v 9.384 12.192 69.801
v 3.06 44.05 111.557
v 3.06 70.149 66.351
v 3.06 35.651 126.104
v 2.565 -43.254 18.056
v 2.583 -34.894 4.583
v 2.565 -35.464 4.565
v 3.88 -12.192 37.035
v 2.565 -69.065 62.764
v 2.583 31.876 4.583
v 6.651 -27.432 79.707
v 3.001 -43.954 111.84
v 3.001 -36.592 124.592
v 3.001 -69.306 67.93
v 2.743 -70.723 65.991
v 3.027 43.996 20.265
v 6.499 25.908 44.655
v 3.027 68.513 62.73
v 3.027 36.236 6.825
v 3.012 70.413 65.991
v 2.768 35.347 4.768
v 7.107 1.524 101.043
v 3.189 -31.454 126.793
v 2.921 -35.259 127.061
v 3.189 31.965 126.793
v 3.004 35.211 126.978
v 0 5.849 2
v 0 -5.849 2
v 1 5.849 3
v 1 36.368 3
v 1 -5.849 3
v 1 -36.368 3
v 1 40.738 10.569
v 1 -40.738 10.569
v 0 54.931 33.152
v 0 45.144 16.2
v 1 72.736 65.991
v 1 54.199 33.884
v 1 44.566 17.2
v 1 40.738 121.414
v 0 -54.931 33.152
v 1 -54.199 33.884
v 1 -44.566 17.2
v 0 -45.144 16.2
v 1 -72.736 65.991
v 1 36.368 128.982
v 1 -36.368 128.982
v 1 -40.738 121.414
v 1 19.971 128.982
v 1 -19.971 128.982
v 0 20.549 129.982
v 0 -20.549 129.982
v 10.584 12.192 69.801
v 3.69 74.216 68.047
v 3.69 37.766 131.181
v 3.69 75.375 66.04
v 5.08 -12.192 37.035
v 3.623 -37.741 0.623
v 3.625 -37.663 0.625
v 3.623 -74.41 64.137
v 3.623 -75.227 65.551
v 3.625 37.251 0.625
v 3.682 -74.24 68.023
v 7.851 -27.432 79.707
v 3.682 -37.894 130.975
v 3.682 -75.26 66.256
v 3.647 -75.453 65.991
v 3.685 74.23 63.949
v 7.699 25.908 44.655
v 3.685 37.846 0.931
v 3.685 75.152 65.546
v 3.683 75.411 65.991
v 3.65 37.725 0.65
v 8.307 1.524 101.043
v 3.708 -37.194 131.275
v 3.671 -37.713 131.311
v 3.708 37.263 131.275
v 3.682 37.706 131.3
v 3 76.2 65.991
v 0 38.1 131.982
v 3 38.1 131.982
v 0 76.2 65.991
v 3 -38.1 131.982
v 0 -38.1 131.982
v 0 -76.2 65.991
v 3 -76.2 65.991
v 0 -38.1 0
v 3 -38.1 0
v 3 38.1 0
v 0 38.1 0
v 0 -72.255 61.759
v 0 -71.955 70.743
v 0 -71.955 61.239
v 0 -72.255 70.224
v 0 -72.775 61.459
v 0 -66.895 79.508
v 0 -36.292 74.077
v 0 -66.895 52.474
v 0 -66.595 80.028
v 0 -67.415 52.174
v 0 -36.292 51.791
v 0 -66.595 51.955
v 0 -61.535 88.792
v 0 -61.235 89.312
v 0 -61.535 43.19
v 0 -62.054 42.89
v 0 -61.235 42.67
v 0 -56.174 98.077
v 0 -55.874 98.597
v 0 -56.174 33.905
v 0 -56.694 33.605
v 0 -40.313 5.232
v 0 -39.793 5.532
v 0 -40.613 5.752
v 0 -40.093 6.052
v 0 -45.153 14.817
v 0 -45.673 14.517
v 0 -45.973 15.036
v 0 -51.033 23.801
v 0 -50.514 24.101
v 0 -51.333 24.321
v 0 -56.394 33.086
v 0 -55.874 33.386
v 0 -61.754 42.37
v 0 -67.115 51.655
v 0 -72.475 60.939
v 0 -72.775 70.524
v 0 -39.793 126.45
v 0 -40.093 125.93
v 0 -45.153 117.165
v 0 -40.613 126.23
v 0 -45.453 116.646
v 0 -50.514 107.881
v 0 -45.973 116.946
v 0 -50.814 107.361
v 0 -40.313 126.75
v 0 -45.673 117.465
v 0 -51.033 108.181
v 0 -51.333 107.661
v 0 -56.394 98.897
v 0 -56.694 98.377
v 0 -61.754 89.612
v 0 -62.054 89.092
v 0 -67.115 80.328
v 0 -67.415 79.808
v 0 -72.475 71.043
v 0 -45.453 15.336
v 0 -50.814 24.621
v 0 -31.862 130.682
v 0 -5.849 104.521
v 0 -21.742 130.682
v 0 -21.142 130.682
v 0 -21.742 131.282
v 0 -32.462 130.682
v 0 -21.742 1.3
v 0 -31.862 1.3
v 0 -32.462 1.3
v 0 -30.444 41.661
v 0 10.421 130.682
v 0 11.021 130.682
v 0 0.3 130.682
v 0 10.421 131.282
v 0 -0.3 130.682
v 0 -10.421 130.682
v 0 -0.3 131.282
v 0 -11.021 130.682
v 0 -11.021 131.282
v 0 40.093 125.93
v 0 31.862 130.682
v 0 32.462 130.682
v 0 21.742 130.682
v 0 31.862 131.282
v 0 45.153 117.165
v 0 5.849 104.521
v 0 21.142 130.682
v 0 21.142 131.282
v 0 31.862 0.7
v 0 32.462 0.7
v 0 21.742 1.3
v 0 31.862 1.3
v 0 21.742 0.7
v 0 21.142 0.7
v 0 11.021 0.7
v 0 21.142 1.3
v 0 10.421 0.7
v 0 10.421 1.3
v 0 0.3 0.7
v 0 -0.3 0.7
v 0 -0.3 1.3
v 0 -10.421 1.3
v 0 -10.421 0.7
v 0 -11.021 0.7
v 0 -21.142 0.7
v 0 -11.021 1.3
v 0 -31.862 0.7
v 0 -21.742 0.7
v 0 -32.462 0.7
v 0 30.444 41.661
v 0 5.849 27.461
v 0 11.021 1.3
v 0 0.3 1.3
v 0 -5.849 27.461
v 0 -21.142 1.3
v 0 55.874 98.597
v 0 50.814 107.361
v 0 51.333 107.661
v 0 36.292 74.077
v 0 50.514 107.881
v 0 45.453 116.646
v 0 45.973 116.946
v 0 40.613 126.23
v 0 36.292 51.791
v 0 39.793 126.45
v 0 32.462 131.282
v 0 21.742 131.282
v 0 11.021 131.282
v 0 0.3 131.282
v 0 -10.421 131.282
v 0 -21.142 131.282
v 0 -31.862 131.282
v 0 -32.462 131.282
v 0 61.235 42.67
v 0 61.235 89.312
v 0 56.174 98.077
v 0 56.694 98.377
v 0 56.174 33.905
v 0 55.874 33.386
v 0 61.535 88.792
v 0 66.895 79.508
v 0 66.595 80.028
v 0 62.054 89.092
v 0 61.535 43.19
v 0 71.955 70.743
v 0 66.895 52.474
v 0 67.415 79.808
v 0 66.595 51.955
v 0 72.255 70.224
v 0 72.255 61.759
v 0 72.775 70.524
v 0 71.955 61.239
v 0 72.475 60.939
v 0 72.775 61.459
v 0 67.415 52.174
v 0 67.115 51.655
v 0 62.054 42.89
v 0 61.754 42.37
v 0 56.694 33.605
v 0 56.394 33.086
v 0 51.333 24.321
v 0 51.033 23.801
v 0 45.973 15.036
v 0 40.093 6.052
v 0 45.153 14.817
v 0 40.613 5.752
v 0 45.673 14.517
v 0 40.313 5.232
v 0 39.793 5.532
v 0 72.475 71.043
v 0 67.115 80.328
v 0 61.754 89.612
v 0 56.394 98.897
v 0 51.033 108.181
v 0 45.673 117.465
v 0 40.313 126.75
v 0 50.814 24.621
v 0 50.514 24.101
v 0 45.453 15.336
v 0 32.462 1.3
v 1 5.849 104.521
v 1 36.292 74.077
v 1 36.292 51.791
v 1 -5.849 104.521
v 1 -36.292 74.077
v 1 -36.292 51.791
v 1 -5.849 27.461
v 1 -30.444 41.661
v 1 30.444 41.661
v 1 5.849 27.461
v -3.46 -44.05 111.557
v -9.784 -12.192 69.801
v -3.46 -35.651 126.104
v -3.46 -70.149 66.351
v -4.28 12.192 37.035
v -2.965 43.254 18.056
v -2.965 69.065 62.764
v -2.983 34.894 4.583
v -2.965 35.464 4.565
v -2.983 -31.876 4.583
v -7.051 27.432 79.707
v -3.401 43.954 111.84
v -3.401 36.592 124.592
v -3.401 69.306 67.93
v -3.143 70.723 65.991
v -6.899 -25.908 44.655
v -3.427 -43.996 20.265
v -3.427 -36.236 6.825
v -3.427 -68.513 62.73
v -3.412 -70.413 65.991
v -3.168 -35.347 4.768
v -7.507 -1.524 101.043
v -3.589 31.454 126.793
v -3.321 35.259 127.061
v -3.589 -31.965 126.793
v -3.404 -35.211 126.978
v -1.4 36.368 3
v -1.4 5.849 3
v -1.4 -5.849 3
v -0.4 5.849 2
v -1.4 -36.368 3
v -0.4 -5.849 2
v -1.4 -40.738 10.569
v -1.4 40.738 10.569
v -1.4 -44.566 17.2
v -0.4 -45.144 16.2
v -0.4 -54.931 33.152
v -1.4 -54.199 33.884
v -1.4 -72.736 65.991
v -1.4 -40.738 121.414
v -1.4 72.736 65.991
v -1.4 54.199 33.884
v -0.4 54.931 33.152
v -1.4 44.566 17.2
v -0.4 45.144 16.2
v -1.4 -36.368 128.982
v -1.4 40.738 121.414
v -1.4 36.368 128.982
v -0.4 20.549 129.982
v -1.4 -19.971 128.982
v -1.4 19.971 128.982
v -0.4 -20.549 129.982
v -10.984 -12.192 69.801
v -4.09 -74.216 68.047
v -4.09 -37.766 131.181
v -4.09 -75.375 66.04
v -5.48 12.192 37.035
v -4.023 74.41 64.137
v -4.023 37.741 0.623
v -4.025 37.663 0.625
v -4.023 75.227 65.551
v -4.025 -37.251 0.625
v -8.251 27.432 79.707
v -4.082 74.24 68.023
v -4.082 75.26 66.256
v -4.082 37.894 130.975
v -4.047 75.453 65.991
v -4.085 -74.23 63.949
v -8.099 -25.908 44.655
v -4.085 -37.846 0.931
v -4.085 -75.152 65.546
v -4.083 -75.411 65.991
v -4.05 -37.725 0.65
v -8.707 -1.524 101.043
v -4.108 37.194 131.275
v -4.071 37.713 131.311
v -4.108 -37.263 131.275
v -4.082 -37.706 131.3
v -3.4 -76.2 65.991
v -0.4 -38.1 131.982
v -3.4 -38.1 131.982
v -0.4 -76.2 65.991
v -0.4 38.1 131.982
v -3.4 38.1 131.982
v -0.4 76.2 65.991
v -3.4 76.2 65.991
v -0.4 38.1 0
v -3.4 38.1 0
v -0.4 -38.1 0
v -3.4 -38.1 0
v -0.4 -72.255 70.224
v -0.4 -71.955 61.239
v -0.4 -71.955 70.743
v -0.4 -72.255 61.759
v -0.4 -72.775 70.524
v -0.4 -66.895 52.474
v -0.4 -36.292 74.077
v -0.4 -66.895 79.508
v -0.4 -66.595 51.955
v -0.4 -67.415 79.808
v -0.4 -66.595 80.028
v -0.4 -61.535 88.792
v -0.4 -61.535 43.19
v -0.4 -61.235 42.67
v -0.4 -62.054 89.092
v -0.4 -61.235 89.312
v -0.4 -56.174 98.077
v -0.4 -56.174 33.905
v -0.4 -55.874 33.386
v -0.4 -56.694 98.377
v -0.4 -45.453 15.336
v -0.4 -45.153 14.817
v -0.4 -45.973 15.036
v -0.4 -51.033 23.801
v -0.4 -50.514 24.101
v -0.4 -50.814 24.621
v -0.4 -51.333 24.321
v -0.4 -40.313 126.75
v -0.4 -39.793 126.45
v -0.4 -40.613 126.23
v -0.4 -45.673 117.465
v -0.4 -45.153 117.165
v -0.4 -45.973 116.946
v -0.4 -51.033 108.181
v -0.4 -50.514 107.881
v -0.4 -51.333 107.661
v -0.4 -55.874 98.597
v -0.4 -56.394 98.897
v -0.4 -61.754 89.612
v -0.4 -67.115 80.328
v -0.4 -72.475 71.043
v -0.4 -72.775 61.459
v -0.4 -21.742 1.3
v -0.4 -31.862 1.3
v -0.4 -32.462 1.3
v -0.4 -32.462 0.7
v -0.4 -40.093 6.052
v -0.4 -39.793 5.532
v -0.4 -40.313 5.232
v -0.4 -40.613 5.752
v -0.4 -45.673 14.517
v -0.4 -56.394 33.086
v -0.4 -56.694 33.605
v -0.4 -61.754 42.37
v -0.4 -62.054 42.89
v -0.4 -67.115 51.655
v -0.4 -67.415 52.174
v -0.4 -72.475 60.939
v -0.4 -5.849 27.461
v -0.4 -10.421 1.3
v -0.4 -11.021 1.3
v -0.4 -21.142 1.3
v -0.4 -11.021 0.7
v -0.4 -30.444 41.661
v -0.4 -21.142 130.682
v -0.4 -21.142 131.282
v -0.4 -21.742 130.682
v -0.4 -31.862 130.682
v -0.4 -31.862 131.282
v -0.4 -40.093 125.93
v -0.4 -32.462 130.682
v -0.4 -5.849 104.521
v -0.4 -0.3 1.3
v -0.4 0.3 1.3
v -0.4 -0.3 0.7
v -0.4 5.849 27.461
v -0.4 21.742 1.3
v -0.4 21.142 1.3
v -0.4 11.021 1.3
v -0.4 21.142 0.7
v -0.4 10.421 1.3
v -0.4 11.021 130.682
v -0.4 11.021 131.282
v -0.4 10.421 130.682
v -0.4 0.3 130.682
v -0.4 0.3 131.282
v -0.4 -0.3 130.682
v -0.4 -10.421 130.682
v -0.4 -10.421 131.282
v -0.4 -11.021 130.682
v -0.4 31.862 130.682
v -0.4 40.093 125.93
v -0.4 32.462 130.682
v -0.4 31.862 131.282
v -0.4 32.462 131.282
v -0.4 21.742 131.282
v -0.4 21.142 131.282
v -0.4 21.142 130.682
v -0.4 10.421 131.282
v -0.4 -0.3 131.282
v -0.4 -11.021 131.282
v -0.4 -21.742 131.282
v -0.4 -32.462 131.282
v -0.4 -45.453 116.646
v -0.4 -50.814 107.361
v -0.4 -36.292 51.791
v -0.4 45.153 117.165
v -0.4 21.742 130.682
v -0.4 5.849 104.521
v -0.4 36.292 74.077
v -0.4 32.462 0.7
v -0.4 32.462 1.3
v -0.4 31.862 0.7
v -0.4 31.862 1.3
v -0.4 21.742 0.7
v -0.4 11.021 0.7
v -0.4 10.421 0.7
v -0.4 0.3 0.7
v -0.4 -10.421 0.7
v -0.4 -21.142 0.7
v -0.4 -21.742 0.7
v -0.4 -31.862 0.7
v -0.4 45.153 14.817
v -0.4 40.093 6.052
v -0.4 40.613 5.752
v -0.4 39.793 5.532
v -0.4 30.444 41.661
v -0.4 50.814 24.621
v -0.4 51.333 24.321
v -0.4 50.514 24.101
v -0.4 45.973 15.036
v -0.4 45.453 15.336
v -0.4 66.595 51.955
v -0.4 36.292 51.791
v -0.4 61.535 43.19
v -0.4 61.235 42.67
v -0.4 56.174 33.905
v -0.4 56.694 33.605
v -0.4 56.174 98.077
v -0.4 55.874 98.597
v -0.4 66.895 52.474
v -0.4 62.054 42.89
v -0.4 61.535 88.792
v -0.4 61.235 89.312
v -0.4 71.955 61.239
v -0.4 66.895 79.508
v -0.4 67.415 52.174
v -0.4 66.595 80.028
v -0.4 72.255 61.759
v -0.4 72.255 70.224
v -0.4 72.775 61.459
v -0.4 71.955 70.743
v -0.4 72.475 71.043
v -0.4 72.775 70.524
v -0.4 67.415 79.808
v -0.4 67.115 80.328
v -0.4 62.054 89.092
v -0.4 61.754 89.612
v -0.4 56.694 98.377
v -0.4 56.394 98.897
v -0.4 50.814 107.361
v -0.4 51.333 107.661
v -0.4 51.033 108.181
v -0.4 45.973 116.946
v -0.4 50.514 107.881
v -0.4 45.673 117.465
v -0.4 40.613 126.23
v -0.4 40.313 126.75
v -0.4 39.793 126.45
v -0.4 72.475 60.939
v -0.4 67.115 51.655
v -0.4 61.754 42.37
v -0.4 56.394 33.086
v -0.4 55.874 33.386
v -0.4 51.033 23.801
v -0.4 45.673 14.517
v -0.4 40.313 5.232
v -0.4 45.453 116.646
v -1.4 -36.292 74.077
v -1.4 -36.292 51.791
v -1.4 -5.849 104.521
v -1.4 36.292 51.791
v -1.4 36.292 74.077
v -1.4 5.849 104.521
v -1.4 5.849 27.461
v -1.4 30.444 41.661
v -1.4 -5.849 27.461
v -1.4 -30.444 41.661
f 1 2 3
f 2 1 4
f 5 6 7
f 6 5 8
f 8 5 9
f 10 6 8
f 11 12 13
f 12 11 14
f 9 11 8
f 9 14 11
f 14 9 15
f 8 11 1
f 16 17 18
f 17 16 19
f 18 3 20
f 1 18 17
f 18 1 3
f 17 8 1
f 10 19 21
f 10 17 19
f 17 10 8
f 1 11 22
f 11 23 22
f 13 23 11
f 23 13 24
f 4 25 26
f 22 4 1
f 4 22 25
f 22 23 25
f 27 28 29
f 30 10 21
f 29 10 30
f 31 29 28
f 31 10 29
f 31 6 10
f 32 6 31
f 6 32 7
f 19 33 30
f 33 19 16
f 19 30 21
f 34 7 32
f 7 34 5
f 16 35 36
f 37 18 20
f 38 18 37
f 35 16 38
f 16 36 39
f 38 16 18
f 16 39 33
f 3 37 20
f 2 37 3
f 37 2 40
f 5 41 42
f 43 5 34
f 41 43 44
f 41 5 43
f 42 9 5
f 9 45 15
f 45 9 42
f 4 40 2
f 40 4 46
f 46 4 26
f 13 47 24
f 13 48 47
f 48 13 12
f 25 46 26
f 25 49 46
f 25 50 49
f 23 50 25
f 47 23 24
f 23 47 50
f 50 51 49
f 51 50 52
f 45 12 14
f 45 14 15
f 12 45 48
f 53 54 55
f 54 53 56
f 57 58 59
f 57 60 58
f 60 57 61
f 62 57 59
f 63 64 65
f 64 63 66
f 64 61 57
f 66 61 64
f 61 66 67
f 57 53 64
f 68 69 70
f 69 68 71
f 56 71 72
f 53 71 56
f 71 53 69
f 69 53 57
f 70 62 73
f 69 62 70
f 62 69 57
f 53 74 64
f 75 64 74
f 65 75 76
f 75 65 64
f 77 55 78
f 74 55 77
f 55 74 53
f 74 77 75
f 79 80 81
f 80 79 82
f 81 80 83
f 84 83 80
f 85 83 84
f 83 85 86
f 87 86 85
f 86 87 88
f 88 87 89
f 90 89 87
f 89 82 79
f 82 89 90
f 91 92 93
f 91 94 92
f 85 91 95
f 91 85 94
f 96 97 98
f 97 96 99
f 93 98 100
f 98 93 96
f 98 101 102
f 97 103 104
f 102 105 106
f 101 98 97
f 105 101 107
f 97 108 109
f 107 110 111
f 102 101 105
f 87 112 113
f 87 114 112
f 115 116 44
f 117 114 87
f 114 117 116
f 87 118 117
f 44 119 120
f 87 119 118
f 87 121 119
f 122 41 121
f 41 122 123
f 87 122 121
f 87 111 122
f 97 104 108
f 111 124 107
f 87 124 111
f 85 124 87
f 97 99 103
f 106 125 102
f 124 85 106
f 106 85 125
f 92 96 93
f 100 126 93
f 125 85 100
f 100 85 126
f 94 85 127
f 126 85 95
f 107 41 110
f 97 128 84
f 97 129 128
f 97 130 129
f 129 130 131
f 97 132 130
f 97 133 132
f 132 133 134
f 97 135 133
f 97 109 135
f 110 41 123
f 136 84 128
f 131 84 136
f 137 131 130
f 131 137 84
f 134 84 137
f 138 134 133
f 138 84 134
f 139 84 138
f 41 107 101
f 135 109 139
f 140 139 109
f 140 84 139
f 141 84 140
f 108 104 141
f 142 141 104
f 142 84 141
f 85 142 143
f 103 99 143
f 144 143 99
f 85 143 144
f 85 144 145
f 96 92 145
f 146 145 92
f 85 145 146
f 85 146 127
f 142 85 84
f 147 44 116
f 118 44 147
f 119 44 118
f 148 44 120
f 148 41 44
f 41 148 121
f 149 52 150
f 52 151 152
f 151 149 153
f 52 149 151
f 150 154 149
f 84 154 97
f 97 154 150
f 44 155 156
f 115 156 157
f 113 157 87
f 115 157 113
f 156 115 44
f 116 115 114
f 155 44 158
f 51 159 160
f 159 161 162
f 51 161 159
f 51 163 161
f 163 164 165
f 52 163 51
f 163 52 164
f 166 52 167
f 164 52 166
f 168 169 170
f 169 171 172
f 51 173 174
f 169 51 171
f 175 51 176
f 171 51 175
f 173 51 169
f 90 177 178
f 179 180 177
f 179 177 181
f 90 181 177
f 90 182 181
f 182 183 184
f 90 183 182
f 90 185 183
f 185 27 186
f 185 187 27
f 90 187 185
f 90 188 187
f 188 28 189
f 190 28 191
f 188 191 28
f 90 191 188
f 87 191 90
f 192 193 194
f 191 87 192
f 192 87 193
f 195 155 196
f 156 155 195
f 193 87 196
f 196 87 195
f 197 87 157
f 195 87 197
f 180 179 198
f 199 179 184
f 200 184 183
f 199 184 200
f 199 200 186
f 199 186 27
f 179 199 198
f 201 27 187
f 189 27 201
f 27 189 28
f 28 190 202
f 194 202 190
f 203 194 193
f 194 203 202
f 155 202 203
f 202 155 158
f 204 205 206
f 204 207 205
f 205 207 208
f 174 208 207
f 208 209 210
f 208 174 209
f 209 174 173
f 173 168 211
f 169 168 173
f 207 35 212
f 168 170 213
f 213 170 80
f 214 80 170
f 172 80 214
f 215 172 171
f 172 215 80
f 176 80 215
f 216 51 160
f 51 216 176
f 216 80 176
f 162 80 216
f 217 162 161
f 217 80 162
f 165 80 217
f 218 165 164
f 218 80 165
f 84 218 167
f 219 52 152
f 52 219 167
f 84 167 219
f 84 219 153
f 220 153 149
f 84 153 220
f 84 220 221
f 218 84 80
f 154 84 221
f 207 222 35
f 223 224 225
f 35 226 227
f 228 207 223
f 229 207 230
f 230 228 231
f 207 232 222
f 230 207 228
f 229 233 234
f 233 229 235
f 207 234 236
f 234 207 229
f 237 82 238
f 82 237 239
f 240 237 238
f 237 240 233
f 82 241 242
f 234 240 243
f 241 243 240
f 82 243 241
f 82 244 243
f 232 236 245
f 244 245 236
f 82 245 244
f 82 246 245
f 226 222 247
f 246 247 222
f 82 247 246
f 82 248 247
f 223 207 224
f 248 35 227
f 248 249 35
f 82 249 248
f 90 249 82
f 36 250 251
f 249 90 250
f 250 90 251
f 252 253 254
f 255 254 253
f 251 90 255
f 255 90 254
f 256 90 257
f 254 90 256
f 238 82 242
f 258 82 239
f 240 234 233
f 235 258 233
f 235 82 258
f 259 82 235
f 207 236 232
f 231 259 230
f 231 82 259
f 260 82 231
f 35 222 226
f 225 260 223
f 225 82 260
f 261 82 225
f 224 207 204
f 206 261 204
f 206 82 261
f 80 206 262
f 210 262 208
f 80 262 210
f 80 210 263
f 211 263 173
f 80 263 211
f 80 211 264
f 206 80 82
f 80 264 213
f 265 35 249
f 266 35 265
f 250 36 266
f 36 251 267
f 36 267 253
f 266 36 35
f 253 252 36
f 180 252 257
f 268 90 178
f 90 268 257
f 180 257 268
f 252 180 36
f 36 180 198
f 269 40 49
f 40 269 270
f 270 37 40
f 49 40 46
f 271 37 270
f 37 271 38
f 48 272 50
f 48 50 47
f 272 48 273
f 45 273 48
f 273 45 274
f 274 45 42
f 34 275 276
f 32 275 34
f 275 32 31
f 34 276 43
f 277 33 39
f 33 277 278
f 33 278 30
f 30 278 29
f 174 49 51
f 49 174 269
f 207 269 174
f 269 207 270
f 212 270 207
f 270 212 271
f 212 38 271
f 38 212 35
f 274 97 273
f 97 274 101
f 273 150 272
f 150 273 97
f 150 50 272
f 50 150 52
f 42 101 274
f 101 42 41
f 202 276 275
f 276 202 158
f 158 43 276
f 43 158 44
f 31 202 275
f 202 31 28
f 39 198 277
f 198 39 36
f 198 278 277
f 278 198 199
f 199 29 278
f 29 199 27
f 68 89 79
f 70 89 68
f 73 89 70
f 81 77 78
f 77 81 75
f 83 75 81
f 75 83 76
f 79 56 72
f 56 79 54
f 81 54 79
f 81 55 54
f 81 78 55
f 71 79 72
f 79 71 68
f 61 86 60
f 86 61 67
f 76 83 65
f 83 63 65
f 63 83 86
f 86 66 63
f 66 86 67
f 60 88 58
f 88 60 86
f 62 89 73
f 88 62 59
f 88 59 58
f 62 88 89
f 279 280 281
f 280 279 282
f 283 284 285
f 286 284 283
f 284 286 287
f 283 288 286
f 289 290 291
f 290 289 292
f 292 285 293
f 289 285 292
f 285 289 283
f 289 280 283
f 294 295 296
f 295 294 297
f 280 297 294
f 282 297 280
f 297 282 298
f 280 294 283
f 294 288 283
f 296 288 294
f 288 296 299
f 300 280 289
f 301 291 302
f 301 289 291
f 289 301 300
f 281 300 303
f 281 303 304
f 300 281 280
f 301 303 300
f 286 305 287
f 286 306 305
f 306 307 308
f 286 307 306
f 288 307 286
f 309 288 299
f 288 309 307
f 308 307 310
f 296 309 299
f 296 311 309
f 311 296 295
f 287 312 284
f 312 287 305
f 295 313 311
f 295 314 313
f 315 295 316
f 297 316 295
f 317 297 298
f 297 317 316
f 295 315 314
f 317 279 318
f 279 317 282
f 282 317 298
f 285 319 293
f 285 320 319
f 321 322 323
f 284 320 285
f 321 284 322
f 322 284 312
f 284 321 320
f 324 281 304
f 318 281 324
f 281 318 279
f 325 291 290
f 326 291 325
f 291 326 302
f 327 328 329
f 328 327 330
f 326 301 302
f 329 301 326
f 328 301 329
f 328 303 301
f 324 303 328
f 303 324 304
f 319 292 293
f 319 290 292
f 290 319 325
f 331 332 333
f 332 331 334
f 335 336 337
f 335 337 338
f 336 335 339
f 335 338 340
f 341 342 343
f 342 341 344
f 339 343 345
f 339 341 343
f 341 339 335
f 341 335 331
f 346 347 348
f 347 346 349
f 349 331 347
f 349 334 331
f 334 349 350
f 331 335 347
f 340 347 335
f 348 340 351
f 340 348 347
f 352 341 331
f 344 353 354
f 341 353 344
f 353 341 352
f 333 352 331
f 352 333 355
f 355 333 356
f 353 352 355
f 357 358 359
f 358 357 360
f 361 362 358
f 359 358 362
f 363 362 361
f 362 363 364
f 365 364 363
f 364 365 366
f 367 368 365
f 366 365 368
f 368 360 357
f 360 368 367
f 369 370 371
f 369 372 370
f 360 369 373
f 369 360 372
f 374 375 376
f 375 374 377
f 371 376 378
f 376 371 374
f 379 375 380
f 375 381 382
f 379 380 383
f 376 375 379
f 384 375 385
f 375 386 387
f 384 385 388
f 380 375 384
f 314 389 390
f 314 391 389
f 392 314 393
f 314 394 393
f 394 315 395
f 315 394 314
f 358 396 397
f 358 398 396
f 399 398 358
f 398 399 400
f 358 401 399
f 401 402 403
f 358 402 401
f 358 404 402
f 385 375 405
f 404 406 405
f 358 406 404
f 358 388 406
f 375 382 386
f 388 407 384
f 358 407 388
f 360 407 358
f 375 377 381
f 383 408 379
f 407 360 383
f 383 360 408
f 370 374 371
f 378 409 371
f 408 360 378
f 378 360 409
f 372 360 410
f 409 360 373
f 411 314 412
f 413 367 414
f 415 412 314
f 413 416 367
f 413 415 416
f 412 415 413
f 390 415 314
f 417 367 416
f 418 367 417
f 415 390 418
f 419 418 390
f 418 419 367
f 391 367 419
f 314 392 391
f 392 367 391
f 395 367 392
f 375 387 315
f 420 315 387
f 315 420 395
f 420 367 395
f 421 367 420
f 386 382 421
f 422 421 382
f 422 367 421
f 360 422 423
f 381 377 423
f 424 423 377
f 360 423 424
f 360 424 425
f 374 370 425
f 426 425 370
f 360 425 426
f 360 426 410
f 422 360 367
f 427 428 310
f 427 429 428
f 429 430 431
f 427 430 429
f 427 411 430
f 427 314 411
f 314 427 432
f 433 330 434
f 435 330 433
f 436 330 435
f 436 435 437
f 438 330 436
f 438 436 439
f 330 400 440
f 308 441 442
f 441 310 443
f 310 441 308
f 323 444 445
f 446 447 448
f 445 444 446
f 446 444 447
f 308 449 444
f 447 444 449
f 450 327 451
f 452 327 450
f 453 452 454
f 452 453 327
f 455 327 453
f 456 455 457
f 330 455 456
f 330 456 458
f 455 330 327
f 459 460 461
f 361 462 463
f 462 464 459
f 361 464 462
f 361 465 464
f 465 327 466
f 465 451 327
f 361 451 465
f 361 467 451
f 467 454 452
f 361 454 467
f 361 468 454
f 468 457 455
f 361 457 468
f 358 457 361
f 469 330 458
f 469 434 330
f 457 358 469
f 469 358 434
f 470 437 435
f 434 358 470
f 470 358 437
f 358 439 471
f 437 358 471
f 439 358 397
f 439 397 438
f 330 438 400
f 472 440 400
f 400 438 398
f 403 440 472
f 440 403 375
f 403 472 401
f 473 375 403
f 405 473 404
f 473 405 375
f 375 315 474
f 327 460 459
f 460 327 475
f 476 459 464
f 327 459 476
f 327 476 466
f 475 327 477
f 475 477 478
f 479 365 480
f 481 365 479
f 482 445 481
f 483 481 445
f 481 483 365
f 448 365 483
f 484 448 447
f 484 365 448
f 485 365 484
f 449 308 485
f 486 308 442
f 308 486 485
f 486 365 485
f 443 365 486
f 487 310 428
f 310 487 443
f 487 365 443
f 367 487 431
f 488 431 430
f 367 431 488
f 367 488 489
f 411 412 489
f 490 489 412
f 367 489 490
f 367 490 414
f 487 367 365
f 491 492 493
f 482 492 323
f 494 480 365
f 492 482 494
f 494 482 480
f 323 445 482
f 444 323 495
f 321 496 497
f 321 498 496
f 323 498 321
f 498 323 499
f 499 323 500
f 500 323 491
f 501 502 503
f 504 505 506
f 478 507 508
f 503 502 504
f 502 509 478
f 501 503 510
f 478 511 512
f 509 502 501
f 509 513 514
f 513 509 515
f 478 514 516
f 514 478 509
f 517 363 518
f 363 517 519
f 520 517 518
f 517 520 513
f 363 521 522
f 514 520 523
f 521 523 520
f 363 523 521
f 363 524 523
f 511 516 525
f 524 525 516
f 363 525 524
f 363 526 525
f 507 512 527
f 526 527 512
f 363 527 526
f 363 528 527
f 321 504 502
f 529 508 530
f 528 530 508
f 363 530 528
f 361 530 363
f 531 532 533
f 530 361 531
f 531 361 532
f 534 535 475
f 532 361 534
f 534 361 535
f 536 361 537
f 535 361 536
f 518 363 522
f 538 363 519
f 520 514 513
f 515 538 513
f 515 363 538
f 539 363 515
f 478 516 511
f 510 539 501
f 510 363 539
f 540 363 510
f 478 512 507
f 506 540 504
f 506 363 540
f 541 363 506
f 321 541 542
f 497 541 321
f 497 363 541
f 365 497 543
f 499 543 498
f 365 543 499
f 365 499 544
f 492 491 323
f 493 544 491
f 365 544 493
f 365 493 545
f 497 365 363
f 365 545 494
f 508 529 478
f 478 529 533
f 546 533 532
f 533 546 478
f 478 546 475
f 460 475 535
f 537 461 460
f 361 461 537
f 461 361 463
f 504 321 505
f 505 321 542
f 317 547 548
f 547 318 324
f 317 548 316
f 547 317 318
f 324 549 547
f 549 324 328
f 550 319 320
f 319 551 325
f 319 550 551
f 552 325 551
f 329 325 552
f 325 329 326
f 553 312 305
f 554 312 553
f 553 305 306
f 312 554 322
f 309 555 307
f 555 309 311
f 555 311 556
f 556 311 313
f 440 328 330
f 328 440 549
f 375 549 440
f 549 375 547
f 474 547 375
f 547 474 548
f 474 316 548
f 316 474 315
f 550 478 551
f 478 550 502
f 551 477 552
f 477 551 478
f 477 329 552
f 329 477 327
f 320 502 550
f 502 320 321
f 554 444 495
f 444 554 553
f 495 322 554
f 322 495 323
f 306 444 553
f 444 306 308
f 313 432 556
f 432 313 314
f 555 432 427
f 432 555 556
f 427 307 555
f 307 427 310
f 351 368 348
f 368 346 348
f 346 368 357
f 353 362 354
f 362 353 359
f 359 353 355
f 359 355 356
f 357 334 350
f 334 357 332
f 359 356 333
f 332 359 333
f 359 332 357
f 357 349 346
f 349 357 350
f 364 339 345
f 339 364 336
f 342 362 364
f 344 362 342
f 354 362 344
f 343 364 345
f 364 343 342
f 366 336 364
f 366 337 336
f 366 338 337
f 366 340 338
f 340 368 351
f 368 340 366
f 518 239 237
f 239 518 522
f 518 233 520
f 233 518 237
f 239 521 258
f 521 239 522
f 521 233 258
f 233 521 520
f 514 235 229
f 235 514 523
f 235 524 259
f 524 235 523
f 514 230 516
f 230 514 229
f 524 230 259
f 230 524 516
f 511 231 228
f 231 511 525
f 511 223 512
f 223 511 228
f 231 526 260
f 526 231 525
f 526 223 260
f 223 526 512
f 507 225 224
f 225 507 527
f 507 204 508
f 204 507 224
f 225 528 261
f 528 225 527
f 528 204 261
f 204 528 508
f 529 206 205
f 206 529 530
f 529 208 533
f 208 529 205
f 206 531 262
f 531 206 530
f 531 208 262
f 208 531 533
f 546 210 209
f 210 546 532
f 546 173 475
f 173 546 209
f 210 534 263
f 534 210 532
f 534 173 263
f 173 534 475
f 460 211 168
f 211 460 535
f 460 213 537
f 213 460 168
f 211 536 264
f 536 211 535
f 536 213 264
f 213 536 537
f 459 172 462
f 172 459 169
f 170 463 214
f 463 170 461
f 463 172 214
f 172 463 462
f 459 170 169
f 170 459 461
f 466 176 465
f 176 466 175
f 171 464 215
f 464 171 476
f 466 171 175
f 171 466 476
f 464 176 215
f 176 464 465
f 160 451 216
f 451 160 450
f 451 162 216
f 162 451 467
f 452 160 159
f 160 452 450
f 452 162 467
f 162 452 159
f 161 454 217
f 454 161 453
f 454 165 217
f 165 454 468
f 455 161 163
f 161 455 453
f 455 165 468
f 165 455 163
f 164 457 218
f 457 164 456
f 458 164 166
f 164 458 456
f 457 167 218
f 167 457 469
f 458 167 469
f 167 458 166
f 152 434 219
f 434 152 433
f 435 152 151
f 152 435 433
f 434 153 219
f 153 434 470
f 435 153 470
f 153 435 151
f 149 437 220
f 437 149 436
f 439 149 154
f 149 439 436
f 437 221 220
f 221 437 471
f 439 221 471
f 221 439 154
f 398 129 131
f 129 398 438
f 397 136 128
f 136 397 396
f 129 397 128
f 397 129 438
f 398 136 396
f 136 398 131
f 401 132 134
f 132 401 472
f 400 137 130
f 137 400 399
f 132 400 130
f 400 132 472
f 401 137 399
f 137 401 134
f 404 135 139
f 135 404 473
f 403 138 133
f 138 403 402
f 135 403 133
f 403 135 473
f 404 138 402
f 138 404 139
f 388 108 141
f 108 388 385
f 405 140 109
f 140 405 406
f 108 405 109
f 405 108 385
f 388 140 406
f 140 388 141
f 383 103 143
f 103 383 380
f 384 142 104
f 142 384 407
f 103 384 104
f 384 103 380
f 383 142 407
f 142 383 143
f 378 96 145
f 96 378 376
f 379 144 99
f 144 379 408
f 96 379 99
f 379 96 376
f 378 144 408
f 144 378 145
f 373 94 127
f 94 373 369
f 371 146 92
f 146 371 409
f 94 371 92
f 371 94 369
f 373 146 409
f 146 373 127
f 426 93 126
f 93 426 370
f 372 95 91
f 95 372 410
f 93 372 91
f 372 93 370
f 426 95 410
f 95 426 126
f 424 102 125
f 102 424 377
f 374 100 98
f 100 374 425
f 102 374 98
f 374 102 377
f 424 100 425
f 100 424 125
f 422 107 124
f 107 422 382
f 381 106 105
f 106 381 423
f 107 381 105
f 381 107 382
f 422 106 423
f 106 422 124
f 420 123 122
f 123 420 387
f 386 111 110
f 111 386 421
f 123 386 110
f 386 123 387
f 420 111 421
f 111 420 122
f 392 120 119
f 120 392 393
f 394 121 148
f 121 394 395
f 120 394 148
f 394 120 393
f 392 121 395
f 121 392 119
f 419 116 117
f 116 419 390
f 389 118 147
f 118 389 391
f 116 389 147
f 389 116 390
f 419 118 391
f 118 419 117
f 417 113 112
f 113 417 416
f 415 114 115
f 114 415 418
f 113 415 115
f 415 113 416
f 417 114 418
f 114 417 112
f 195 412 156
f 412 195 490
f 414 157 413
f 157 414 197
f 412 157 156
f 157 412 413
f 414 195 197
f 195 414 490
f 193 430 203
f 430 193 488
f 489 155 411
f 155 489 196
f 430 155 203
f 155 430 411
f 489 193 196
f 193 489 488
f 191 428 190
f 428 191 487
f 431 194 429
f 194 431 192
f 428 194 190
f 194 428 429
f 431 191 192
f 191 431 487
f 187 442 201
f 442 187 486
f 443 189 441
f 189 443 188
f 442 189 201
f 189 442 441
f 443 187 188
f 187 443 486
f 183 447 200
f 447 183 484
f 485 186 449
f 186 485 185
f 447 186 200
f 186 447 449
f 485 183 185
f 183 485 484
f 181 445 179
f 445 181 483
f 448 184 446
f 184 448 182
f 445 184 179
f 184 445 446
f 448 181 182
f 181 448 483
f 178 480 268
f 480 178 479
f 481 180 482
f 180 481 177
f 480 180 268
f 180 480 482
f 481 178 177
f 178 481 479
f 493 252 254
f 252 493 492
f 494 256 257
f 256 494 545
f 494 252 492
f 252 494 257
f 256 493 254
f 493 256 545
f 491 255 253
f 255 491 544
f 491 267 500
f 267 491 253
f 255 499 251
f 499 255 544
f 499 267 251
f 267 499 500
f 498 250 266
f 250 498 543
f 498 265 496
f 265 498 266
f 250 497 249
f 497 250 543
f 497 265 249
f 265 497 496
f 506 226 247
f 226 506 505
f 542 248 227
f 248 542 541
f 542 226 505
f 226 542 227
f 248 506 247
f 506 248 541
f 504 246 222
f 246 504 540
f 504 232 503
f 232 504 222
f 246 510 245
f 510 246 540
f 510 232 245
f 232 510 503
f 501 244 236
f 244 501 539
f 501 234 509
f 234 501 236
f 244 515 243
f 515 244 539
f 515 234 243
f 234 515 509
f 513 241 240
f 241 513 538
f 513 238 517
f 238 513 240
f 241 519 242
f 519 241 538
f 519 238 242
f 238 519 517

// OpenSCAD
// Hexagon wall tile v40 — parametric rebuild of v30
// Front: identical low-poly facets to v30 (same facet angles at every size).
// Edge profile: identical on every size (edge depth, rim width) so tiles butt flush.
// Back: six corner pads for 1" (25 mm) double-sided mounting tape.
// v32: tape pads are flat plates hung from the rim with an air gap to the front skin.
// v33: thinner skin + thinner pads so the air gap is 1.4 mm even right at the edges
//      (v32 had only 0.8 mm there and showed marks along the slanted edges).
// v34: snap-off stabilizer fins behind the bottom edge so the tall, thin tile can't tip over
//      while printing. Break them off afterwards (bend sideways) and the back stays flat.
// v35: 0.6 mm 45° chamfer on the front edge (crisp, consistent shadow line between tiles; hides
//      first-layer squish and brim trim marks) + relief_scale to deepen the facets if wanted.
// v37: much smaller breakaway tabs (0.8 x 0.6 mm, every 8 mm) so the fins snap off easily.
// v38: full-height snap-off BRACE FRAME behind the tile: a thin hex ring + X/vertical bars,
//      1 mm behind the back, tied to the tile rim by tiny tabs all the way round (incl. the top).
//      Tile + brace act as a stiff box while printing; the fins now sit on the brace.
//      Peel the brace off after printing — the tabs only touch the back rim.
// v39: PAIR mode (default): two identical tiles printed back-to-back, 0.4 mm apart, so each
//      cradles the other full-height. Only 12 tiny tabs (corners + mid-sides) join the back
//      rims — twist/peel the tiles apart. No brace, no fins, almost no waste. The pair is
//      turned 90° on the bed so the 'back' seam lands on a side edge, not on either face.
// v40: pair tabs spaced evenly every ~pair_tab_pitch mm round the rim on EVERY size. In v39 the
//      tab spacing grew with the tile (3": ~23 mm max gap, 6": ~46 mm, 10": ~79 mm), so the 3" pair
//      printed perfectly but the 6" rims flexed apart between tabs and broke up above mid-height.
//      Now every size has the same tab spacing as a stiff 3" pair (or tighter).
// Prints upright on a flat edge with NO supports (every downward edge is 45° or steeper).
//
// Export one size at a time, e.g.:
//   openscad -D size_in=6 -o hex_pair_v40_6in.stl hex_wall_tile_v40.scad

/* [Size] */
size_in       = 6;      // point-to-point width in inches (3, 6, 10 ...)

/* [Edge profile — keep identical across sizes] */
// Space behind the skin at the edge = edge_depth - skin; it must be >= pad_plate + pad_gap + pad_recess.
edge_depth    = 3.6;    // depth of the outer edge, back plane to front face (mm)
rim           = 2.0;    // perimeter wall thickness at the back plane (mm)
front_chamfer = 0.6;    // 45° chamfer on the front edge (mm); 0 = sharp edge

/* [Look] */
relief_scale  = 1.0;    // 1.0 = v30 facets; 1.5 = 50% deeper facets (same edge profile on all sizes)

/* [Front skin] */
skin          = 1.2;    // front skin thickness (mm) — 3 lines at 0.4 mm, same on all sizes

/* [Tape pads] */
tape_width    = 25.4;   // tape width (mm)
pad_margin    = 3;      // extra pad width beyond the tape (mm)
pad_max_frac  = 0.45;   // pad never larger than this fraction of the tile radius (keeps 3" usable)
pad_plate     = 1.0;    // thickness of the pad plates (mm)
pad_gap       = 1.4;    // minimum air gap between pads and the front skin (mm) — keeps the front clean
pad_recess    = 0;      // pads set back from the rim (mm); >0 lets the rim touch the wall,
                        // but near the edges the plate is then trimmed thinner to keep pad_gap

/* [Print stabilizers (snap off after printing)] */
stabilizers   = false;  // v34-v38 option; not needed in pair mode
fin_count     = 2;      // fins behind the bottom edge, placed symmetrically
fin_thick     = 1.6;    // fin thickness (mm)
fin_height_frac = 0.35; // fin height as a fraction of the tile height
fin_depth_frac  = 0.4;  // fin depth behind the brace as a fraction of fin height
fin_depth_min   = 15;   // (mm)
fin_gap       = 0.5;    // air gap between fin and tile back (mm)
tab_height    = 0.6;    // breakaway tab height (mm, vertical when printing) — 3 layers at 0.2
tab_width     = 0.8;    // breakaway tab width (mm), centred on the fin — 2 lines
tab_pitch     = 8;      // spacing between tabs (mm)

/* [Full-height brace frame (snap off after printing)] */
brace         = false;  // v38 option; not needed in pair mode
brace_gap     = 1.0;    // air gap between tile back and brace (mm)
brace_thick   = 1.6;    // brace thickness (mm)
brace_rim_w   = 4;      // width of the brace's hex ring (mm)
brace_bar_w   = 3;      // width of the X and vertical bars (mm)
brace_tab_pitch = 10;   // spacing of brace tabs along each rim side (mm)
brace_tab     = 0.8;    // brace tab size (mm) — tiny, so the brace peels off

/* [Back-to-back pair (default)] */
pair          = true;
pair_gap      = 0.4;    // gap between the two back planes (mm): close enough to cradle, not fused
pair_tab      = 0.6;    // tab size (mm) — tiny, so the pair twists apart
pair_tab_pitch = 12;    // max spacing between tabs along the rim (mm), same on every size

/* [Output] */
orient_for_print = true; // stand upright on a flat edge, back facing +Y

/* [Hidden] */
R   = size_in * 25.4 / 2;         // corner radius
AP  = R * cos(30);                // apothem
PAD = min(tape_width + pad_margin, R * pad_max_frac);

// Normalised front geometry from v30 (x, y in units of R; z = relief above edge, units of R)
FP = [[1,0,0],[0.5,0.866025,0],[-0.5,0.866025,0],[-1,0,0],[-0.5,-0.866025,0],[0.5,-0.866025,0],
      [0.16,0.05,0.091654],[-0.16,-0.38,0.019428],[-0.36,0.18,0.05579],[0.34,-0.28,0.053795],[0.02,0.46,0.061766]];
FACES = [[0,6,1],[4,3,7],[5,4,7],[8,3,2],[7,3,8],[7,8,6],[5,9,0],[9,6,0],[9,7,6],[5,7,9],
         [6,8,10],[8,2,10],[6,10,1],[10,2,1],
         [1,12,11,0],[2,13,12,1],[3,14,13,2],[4,15,14,3],[5,16,15,4],[0,11,16,5],
         [11,12,13,14,15,16]];
RELIEF_MAX = 0.091654 * R * relief_scale;
D = edge_depth + RELIEF_MAX + 1;  // max depth used for chamfers

// Solid bounded by the faceted front (shifted by dz) and a flat back at z = zb
module body(dz = 0, zb = 0) {
    pts = concat(
        [for (p = FP) [p[0]*R, p[1]*R, edge_depth + p[2]*R*relief_scale + dz]],
        [for (i = [0:5]) [FP[i][0]*R, FP[i][1]*R, zb]]);
    polyhedron(points = pts, faces = FACES, convexity = 4);
}

module hex2d(apothem) { circle(r = apothem / cos(30), $fn = 6); }

// Back cavity: behind the skin, inside the rim; rim inner faces slope 45° so nothing needs support
module cavity(extra = 0) {
    H  = D + 2;
    a0 = AP - rim - extra + 1;             // apothem at z = -1
    intersection() {
        body(dz = -skin - extra, zb = -1);
        translate([0, 0, -1]) linear_extrude(height = H, scale = (a0 - H) / a0) hex2d(a0);
    }
}

// Corner pad footprint (2D), k = corner index 0..5:
// the corner region of the inner hex, PAD wide, long enough to hold a PAD x PAD square of tape
module pad_core(k) {
    U0  = (AP - rim) / cos(30);                    // inner corner distance from centre
    LEN = PAD / (2 * tan(60)) + PAD + 1;           // apex taper + full square + margin
    intersection() {
        hex2d(AP - rim + 0.3);                     // overlap 0.3 mm into the rim to fuse
        rotate(60 * k) translate([U0 - LEN, -PAD / 2]) square([LEN + 5, PAD]);
    }
}

// In-plane self-support: printed upright, a vertical plate needs every downward edge at >= 45°.
// Sweep each pad toward the nearest rim side below it at 45° (or straight down for bottom corners).
SWEEP = [[1, -1], [1, -1], [-1, -1], [-1, -1], [0, -1], [0, -1]];
module pad_fp(k) {
    intersection() {
        hex2d(AP - rim + 0.3);
        hull() { pad_core(k); translate(SWEEP[k] * R) pad_core(k); }
    }
}

module pads() {
    intersection() {
        body(dz = -skin - pad_gap, zb = -1);       // never closer than pad_gap to the skin
        translate([0, 0, pad_recess]) linear_extrude(pad_plate) for (k = [0:5]) pad_fp(k);
    }
}

module chamfer_clip() {
    HB = D + 5;
    union() {
        translate([0, 0, -2]) linear_extrude(edge_depth - front_chamfer + 2) hex2d(AP + 1);
        translate([0, 0, edge_depth - front_chamfer]) linear_extrude(height = HB, scale = (AP - HB) / AP) hex2d(AP);
    }
}

module tile() {
    intersection() {
        union() {
            difference() { body(); cavity(); }
            pads();
        }
        if (front_chamfer > 0) chamfer_clip(); else translate([-2*R, -2*R, -5]) cube([4*R, 4*R, 4*R]);
    }
}

// Triangular fins standing on the bed behind the back (model z < 0), joined to the tile by small tabs
FIN_H = fin_height_frac * 2 * AP;
FIN_L = max(fin_depth_min, fin_depth_frac * FIN_H);
function fin_x(i) = (fin_count == 1) ? 0 : (-1 + 2 * i / (fin_count - 1)) * 0.35 * R;
BZ = brace ? brace_gap + brace_thick : 0;          // fins start behind the brace when it is used
module stabilizer_fins() {
    for (i = [0 : fin_count - 1]) {
        x = fin_x(i);
        fg = brace ? BZ - 0.3 : fin_gap;                // with a brace: fused into it (no tabs needed)
        hull() {                                            // fin: vertical triangle
            translate([x - fin_thick/2, -AP, -fg - FIN_L]) cube([fin_thick, 0.01, FIN_L]);
            translate([x - fin_thick/2, -AP, -fg - 0.01]) cube([fin_thick, FIN_H, 0.01]);
        }
        if (!brace)
            for (y = [0 : tab_pitch : FIN_H - tab_height])  // breakaway tabs into the back plane
                translate([x - tab_width/2, -AP + y, -fin_gap - 0.05]) cube([tab_width, tab_height, fin_gap + 0.35]);
    }
}

// Brace frame (2D, in the tile plane). Printed upright, so every downward-facing edge is >= 45°:
// the top bar is carried by 45° roofs in the two top windows; bars run vertical or at ±60°.
module brace_2d() {
    W  = brace_rim_w;
    Yt = AP - W;                                        // underside of the top ring bar
    difference() {
        hex2d(AP);
        intersection() {                                // the open window, with a 45° roof under the top bar
            hex2d(AP - W);
            // only the two top windows touch the top bar: give them a 45° valley roof
            polygon([[-2*R, -2*R], [2*R, -2*R], [2*R, 2*R], [R/2, 2*R], [R/2, Yt],
                     [0, Yt - R/2], [-R/2, Yt], [-R/2, 2*R], [-2*R, 2*R]]);
        }
    }
    intersection() {
        hex2d(AP);
        union() {
            square([brace_bar_w, 2*AP], center = true);                 // vertical bar
            rotate(60)  square([4*R, brace_bar_w], center = true);      // ±60° diagonals (corner to corner)
            rotate(-60) square([4*R, brace_bar_w], center = true);
        }
    }
}

module brace_frame() {
    translate([0, 0, -BZ]) linear_extrude(brace_thick) brace_2d();
    // tiny tabs across the gap, on the tile's back rim (1 mm in from the outline), all six sides
    for (k = [0:5]) {
        a0 = 60*k; a1 = 60*(k+1);
        p0 = [ (R - 1/sin(60)) * cos(a0), (R - 1/sin(60)) * sin(a0) ];
        p1 = [ (R - 1/sin(60)) * cos(a1), (R - 1/sin(60)) * sin(a1) ];
        L  = norm(p1 - p0);
        n  = floor((L - 6) / brace_tab_pitch);
        for (j = [0 : n]) {
            t = (3 + j * (L - 6) / max(n, 1)) / L;
            p = p0 + t * (p1 - p0);
            translate([p[0], p[1], -brace_gap - 0.3]) rotate(a0 + 120)
                translate([-brace_tab/2, -brace_tab/2, 0]) cube([brace_tab, brace_tab, brace_gap + 0.6]);
        }
    }
}

// Tabs across the pair gap, evenly spaced along each rim side (1 mm in from the outline)
module pair_tabs() {
    rr = R - 1/sin(60);
    n  = max(2, ceil(rr / pair_tab_pitch));          // side length = rr
    for (k = [0:5]) for (i = [0:n-1]) {
        f  = (i + 0.5) / n;
        a0 = 60*k; a1 = 60*(k+1);
        p = [rr*cos(a0), rr*sin(a0)] + f * ([rr*cos(a1), rr*sin(a1)] - [rr*cos(a0), rr*sin(a0)]);
        translate([p[0], p[1], -pair_gap - 0.3]) rotate(a0 + 120)
            translate([-pair_tab/2, -pair_tab/2, 0]) cube([pair_tab, pair_tab, pair_gap + 0.6]);
    }
}
module partner() { translate([0, 0, -pair_gap]) rotate([0, 180, 0]) tile(); }   // same tile turned round, not mirrored

module assembly() {
    tile();
    if (pair) { partner(); pair_tabs(); }
    else { if (brace) brace_frame(); if (stabilizers) stabilizer_fins(); }
}

if (orient_for_print)
    rotate([0, 0, pair ? 90 : 0]) translate([0, 0, AP]) rotate([90, 0, 0]) assembly();
else
    assembly();
